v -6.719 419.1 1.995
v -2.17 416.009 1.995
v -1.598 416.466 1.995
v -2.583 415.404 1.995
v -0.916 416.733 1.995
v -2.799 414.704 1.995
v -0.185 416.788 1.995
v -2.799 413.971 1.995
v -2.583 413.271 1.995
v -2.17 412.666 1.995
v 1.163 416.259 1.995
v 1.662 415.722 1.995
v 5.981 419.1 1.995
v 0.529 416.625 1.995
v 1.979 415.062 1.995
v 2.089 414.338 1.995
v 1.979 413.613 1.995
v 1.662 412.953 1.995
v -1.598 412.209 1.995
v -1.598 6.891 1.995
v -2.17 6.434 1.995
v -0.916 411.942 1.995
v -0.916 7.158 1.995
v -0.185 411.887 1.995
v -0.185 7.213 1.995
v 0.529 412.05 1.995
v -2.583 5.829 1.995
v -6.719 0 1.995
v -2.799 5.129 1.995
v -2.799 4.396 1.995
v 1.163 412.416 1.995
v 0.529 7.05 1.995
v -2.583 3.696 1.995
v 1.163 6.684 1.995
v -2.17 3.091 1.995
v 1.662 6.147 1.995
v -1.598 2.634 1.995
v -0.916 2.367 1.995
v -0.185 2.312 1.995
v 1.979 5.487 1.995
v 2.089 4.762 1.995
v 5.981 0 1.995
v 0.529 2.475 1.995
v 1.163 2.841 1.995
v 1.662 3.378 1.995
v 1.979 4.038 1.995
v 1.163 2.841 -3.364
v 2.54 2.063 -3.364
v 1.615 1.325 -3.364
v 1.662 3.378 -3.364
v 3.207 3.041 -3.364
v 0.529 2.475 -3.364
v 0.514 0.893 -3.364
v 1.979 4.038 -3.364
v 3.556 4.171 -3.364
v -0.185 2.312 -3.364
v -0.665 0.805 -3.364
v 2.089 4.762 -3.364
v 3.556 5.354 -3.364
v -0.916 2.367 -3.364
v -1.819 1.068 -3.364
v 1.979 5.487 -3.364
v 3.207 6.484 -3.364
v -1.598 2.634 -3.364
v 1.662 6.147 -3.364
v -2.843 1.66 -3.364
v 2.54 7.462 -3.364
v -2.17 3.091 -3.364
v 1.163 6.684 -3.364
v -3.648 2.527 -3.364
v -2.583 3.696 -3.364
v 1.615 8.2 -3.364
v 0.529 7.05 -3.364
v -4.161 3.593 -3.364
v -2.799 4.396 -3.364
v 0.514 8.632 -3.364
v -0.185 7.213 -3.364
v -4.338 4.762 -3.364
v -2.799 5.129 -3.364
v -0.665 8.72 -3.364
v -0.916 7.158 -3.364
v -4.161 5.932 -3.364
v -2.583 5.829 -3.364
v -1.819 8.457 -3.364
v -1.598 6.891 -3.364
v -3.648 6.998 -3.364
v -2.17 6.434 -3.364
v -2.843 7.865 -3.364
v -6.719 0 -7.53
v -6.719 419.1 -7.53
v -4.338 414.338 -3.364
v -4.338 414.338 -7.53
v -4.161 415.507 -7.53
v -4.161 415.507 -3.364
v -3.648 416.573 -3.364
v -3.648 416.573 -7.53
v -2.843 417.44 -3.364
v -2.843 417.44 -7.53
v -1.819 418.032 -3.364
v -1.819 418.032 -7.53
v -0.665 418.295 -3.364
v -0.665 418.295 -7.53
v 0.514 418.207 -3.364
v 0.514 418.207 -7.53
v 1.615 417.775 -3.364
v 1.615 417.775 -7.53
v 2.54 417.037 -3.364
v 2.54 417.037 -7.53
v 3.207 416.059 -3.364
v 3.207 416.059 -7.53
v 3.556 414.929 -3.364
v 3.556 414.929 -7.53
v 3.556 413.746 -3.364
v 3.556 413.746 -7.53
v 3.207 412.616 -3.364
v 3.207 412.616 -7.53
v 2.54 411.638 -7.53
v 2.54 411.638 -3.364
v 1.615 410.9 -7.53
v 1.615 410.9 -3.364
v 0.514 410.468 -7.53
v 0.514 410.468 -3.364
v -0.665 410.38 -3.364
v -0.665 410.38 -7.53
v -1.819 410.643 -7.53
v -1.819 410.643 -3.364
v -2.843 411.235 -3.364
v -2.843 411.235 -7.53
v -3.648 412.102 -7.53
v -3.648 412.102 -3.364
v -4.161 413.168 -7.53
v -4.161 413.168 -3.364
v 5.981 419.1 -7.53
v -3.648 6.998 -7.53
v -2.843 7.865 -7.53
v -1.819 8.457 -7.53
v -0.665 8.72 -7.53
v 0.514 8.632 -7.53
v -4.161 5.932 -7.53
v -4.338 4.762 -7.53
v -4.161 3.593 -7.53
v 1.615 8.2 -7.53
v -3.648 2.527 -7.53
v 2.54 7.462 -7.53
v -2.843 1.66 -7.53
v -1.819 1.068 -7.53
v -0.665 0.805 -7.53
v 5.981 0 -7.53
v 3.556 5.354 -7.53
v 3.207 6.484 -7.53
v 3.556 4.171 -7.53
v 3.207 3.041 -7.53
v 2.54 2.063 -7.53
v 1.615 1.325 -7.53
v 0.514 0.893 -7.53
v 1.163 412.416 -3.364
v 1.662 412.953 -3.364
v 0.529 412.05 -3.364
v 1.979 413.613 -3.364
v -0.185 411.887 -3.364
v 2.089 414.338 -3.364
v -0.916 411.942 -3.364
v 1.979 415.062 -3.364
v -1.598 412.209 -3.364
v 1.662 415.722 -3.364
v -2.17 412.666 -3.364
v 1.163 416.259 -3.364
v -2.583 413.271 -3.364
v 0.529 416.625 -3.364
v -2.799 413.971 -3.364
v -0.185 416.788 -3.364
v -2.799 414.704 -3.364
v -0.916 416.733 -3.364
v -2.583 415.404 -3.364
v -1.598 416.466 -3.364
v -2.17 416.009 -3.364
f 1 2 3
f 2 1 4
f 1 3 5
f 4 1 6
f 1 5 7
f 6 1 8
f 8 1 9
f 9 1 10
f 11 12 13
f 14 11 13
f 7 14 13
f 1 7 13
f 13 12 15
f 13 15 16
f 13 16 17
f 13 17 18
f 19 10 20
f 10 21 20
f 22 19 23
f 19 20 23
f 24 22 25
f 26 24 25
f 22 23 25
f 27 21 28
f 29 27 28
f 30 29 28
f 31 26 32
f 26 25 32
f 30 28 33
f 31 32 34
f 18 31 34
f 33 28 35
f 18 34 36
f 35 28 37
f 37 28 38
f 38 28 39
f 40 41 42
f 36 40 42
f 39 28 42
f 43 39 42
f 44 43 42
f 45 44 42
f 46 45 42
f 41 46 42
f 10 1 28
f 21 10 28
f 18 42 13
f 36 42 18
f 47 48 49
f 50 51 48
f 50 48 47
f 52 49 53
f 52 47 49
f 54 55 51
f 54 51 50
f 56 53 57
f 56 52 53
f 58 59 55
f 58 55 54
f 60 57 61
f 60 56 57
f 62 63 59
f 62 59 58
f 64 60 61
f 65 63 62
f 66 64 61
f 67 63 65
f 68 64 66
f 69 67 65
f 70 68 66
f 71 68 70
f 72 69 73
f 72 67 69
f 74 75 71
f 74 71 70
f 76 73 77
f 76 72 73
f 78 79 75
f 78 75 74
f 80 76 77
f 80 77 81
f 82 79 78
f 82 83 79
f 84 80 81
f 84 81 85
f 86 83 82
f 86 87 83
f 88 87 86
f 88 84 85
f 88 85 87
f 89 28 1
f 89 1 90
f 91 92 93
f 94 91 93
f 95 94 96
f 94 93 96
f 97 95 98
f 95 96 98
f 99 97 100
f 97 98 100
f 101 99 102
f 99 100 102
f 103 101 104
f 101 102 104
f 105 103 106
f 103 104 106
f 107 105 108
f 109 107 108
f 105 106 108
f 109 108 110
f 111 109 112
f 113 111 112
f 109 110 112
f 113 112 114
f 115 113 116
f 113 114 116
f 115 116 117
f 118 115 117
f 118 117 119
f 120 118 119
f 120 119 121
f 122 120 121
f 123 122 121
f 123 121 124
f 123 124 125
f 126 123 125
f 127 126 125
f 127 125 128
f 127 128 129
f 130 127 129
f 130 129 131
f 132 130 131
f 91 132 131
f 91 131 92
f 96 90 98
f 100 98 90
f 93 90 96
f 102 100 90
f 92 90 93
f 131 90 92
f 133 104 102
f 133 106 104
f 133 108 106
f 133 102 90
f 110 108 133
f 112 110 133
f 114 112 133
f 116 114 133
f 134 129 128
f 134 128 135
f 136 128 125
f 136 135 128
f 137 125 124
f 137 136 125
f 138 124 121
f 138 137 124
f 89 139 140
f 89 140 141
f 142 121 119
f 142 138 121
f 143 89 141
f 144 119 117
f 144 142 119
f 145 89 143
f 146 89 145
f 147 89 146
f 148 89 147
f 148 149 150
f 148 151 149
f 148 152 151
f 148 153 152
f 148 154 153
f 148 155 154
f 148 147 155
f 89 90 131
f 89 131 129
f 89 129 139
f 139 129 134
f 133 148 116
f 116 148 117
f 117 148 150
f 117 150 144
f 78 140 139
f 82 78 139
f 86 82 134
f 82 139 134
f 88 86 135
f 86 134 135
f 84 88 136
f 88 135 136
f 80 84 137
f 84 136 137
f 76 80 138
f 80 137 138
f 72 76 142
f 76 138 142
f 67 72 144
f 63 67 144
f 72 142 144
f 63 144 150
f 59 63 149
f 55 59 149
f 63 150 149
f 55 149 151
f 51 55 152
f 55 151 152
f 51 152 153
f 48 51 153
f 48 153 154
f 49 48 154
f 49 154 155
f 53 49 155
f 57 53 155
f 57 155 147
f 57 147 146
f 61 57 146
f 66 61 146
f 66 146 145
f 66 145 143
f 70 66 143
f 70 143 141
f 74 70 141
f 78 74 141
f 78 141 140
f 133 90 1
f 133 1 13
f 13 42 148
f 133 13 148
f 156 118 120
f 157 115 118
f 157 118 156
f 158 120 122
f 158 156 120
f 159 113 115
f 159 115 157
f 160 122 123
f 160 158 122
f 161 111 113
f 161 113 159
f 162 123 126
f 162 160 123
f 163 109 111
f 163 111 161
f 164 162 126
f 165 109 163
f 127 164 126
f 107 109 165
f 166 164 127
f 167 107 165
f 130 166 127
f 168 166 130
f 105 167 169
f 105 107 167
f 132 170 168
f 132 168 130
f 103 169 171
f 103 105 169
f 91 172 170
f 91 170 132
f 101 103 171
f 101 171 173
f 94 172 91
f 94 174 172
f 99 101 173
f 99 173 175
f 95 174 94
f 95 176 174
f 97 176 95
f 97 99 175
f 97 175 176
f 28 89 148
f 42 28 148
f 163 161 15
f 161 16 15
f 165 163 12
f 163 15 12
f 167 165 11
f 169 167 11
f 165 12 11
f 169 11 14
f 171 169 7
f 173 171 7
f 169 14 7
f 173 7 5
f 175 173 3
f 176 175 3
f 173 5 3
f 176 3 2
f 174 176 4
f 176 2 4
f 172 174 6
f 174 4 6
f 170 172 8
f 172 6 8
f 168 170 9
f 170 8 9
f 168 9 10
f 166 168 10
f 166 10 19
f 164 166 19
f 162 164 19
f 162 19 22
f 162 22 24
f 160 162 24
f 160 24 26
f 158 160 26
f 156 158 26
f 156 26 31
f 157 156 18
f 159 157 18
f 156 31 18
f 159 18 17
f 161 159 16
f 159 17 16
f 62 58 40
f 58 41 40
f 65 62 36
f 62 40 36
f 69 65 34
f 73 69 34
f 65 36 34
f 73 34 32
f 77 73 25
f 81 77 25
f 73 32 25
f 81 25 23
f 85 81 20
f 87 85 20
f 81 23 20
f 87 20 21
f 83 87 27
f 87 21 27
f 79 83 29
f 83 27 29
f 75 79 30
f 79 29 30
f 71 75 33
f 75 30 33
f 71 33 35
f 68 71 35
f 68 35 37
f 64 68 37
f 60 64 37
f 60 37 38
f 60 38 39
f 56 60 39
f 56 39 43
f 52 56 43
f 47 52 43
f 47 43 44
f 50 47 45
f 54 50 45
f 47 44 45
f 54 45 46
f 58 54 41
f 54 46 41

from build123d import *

# Parameters (mm, degrees)
SKETCH1_W                                      = 12.7
SKETCH1_H                                      = 9.525
BOSS_EXTRUDE1_DEPTH                            = 419.1
CBORE_FOR_8_SOCKET_HEAD_CAP_SCREW1_D           = 4.9149
CBORE_FOR_8_SOCKET_HEAD_CAP_SCREW1_CBORE_D     = 7.9375
CBORE_FOR_8_SOCKET_HEAD_CAP_SCREW1_CBORE_DEPTH = 4.1656


with BuildPart() as part:
    # Sketch1 → Boss-Extrude1 (new body)
    with BuildSketch(Plane(origin=(0, 0, 0), x_dir=(1, 0, 0), z_dir=(0, 1, 0))):
        with Locations((-0.36888069, 2.767280084)):
            Rectangle(SKETCH1_W, SKETCH1_H)
    extrude(amount=BOSS_EXTRUDE1_DEPTH)

    # CBORE for #8 Socket Head Cap Screw1 (through all)
    with Locations(Plane(origin=(0, 0, -7.529780084), x_dir=(-1, 0, 0), z_dir=(0, 0, -1))):
        with Locations((0.36888069, 414.3375), (0.36888069, 4.7625)):
            CounterBoreHole(CBORE_FOR_8_SOCKET_HEAD_CAP_SCREW1_D / 2, CBORE_FOR_8_SOCKET_HEAD_CAP_SCREW1_CBORE_D / 2, CBORE_FOR_8_SOCKET_HEAD_CAP_SCREW1_CBORE_DEPTH)


solid = part.part
